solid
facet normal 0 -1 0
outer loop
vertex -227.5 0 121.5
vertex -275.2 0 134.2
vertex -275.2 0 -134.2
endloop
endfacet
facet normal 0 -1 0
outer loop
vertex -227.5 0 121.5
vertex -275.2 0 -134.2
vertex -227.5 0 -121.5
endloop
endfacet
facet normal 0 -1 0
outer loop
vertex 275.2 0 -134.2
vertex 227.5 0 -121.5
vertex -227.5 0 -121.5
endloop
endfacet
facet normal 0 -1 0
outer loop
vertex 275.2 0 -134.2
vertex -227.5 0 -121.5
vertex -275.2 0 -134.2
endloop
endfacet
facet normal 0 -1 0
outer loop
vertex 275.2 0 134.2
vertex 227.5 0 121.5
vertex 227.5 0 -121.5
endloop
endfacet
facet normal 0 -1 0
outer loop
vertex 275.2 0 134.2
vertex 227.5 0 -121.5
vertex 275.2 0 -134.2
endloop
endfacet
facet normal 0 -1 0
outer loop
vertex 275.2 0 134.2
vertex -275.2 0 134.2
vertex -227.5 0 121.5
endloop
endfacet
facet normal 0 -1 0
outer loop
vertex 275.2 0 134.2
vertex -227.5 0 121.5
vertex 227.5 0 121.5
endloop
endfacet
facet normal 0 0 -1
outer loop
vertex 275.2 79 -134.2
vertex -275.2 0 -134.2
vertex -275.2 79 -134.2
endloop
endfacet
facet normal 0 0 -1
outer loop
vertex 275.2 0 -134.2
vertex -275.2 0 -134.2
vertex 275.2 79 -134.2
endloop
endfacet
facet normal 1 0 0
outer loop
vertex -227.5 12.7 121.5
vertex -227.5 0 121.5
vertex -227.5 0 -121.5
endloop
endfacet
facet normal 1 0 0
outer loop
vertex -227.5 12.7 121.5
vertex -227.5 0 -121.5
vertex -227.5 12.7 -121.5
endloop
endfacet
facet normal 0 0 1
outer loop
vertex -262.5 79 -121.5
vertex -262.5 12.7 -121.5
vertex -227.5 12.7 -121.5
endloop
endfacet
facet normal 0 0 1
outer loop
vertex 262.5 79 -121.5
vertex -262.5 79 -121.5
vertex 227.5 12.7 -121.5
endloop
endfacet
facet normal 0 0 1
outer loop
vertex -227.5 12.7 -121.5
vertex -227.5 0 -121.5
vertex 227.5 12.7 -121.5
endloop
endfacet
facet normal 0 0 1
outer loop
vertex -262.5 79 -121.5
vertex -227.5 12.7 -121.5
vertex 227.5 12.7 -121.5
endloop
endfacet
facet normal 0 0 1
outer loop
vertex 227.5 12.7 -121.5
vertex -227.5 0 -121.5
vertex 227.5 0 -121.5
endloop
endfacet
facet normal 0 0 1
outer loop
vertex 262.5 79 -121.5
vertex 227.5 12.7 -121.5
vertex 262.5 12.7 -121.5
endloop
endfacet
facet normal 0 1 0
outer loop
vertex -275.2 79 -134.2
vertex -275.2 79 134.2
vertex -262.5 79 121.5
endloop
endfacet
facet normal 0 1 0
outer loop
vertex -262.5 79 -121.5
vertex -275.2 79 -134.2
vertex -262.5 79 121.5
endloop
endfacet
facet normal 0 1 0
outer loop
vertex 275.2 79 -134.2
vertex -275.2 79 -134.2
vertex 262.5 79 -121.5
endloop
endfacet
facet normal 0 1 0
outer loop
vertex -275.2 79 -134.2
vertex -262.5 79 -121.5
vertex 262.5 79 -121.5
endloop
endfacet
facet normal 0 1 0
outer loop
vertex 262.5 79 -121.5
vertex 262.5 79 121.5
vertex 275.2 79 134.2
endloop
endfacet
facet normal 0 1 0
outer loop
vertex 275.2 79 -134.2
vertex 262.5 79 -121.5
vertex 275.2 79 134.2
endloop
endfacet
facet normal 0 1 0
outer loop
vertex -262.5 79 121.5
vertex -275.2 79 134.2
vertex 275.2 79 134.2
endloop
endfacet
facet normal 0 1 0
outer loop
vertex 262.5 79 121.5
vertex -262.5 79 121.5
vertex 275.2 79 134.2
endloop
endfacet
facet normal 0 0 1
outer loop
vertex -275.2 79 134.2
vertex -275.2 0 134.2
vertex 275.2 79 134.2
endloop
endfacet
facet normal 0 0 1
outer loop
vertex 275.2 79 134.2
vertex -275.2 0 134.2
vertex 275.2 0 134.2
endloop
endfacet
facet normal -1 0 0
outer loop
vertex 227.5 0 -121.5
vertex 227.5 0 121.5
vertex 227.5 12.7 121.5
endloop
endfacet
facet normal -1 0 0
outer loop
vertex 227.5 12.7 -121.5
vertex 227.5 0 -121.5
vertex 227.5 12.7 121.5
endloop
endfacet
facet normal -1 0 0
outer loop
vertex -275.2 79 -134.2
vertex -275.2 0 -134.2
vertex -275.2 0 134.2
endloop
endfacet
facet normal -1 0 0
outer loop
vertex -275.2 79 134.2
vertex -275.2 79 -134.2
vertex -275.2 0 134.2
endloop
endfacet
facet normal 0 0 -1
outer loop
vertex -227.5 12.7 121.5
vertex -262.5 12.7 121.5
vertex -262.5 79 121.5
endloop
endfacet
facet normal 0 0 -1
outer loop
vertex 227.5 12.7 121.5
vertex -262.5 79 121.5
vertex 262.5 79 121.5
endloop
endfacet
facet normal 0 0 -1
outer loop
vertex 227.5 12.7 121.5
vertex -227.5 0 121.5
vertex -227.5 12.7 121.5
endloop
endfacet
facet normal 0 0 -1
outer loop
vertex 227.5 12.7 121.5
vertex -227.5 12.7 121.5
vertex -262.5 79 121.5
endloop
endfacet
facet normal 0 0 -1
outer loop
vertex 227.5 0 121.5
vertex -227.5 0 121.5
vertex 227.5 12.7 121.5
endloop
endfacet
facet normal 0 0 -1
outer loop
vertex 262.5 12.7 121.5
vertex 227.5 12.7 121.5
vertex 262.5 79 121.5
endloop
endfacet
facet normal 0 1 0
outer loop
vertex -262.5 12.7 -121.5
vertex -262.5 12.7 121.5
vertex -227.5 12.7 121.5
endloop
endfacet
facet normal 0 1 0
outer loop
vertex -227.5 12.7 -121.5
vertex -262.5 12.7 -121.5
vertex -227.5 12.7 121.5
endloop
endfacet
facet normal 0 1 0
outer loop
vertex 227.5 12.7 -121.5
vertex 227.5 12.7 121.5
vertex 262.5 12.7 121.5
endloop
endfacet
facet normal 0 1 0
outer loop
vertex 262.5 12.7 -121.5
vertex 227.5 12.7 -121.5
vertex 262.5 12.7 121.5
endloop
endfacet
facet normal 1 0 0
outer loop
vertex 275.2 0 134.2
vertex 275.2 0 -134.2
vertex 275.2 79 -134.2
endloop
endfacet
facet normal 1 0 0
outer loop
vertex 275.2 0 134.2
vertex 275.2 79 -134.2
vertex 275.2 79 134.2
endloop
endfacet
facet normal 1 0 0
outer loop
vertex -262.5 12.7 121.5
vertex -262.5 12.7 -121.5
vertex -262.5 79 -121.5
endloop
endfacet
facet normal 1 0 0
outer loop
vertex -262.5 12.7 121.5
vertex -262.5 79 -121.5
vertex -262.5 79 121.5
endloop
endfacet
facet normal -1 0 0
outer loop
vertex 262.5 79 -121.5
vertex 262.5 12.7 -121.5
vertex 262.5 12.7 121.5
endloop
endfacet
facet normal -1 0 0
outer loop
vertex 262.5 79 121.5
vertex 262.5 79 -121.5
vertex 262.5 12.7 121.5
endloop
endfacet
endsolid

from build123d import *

# Parameters (mm, degrees)
F0_W     = 550.4
F0_H     = 268.4
F0_W_2   = 525
F0_H_2   = 243
F1_DEPTH = 79
F2_W     = 47.7
F2_H     = 12.7
F3_DEPTH = 268.4


with BuildPart() as f1:
    # F0 (on Front) → F1 (new body)
    with BuildSketch(Plane.XZ):
        Rectangle(F0_W, F0_H)
        Rectangle(F0_W_2, F0_H_2, mode=Mode.SUBTRACT)
    extrude(amount=-F1_DEPTH)

    # F2 (on face) → F3 (join, through all)
    with BuildSketch(Plane.XY.offset(134.2)):
        with Locations((-251.35, 6.35)):
            Rectangle(F2_W, F2_H)
        with Locations((251.35, 6.35)):
            Rectangle(F2_W, F2_H)
    extrude(amount=-F3_DEPTH)


solid = f1.part
